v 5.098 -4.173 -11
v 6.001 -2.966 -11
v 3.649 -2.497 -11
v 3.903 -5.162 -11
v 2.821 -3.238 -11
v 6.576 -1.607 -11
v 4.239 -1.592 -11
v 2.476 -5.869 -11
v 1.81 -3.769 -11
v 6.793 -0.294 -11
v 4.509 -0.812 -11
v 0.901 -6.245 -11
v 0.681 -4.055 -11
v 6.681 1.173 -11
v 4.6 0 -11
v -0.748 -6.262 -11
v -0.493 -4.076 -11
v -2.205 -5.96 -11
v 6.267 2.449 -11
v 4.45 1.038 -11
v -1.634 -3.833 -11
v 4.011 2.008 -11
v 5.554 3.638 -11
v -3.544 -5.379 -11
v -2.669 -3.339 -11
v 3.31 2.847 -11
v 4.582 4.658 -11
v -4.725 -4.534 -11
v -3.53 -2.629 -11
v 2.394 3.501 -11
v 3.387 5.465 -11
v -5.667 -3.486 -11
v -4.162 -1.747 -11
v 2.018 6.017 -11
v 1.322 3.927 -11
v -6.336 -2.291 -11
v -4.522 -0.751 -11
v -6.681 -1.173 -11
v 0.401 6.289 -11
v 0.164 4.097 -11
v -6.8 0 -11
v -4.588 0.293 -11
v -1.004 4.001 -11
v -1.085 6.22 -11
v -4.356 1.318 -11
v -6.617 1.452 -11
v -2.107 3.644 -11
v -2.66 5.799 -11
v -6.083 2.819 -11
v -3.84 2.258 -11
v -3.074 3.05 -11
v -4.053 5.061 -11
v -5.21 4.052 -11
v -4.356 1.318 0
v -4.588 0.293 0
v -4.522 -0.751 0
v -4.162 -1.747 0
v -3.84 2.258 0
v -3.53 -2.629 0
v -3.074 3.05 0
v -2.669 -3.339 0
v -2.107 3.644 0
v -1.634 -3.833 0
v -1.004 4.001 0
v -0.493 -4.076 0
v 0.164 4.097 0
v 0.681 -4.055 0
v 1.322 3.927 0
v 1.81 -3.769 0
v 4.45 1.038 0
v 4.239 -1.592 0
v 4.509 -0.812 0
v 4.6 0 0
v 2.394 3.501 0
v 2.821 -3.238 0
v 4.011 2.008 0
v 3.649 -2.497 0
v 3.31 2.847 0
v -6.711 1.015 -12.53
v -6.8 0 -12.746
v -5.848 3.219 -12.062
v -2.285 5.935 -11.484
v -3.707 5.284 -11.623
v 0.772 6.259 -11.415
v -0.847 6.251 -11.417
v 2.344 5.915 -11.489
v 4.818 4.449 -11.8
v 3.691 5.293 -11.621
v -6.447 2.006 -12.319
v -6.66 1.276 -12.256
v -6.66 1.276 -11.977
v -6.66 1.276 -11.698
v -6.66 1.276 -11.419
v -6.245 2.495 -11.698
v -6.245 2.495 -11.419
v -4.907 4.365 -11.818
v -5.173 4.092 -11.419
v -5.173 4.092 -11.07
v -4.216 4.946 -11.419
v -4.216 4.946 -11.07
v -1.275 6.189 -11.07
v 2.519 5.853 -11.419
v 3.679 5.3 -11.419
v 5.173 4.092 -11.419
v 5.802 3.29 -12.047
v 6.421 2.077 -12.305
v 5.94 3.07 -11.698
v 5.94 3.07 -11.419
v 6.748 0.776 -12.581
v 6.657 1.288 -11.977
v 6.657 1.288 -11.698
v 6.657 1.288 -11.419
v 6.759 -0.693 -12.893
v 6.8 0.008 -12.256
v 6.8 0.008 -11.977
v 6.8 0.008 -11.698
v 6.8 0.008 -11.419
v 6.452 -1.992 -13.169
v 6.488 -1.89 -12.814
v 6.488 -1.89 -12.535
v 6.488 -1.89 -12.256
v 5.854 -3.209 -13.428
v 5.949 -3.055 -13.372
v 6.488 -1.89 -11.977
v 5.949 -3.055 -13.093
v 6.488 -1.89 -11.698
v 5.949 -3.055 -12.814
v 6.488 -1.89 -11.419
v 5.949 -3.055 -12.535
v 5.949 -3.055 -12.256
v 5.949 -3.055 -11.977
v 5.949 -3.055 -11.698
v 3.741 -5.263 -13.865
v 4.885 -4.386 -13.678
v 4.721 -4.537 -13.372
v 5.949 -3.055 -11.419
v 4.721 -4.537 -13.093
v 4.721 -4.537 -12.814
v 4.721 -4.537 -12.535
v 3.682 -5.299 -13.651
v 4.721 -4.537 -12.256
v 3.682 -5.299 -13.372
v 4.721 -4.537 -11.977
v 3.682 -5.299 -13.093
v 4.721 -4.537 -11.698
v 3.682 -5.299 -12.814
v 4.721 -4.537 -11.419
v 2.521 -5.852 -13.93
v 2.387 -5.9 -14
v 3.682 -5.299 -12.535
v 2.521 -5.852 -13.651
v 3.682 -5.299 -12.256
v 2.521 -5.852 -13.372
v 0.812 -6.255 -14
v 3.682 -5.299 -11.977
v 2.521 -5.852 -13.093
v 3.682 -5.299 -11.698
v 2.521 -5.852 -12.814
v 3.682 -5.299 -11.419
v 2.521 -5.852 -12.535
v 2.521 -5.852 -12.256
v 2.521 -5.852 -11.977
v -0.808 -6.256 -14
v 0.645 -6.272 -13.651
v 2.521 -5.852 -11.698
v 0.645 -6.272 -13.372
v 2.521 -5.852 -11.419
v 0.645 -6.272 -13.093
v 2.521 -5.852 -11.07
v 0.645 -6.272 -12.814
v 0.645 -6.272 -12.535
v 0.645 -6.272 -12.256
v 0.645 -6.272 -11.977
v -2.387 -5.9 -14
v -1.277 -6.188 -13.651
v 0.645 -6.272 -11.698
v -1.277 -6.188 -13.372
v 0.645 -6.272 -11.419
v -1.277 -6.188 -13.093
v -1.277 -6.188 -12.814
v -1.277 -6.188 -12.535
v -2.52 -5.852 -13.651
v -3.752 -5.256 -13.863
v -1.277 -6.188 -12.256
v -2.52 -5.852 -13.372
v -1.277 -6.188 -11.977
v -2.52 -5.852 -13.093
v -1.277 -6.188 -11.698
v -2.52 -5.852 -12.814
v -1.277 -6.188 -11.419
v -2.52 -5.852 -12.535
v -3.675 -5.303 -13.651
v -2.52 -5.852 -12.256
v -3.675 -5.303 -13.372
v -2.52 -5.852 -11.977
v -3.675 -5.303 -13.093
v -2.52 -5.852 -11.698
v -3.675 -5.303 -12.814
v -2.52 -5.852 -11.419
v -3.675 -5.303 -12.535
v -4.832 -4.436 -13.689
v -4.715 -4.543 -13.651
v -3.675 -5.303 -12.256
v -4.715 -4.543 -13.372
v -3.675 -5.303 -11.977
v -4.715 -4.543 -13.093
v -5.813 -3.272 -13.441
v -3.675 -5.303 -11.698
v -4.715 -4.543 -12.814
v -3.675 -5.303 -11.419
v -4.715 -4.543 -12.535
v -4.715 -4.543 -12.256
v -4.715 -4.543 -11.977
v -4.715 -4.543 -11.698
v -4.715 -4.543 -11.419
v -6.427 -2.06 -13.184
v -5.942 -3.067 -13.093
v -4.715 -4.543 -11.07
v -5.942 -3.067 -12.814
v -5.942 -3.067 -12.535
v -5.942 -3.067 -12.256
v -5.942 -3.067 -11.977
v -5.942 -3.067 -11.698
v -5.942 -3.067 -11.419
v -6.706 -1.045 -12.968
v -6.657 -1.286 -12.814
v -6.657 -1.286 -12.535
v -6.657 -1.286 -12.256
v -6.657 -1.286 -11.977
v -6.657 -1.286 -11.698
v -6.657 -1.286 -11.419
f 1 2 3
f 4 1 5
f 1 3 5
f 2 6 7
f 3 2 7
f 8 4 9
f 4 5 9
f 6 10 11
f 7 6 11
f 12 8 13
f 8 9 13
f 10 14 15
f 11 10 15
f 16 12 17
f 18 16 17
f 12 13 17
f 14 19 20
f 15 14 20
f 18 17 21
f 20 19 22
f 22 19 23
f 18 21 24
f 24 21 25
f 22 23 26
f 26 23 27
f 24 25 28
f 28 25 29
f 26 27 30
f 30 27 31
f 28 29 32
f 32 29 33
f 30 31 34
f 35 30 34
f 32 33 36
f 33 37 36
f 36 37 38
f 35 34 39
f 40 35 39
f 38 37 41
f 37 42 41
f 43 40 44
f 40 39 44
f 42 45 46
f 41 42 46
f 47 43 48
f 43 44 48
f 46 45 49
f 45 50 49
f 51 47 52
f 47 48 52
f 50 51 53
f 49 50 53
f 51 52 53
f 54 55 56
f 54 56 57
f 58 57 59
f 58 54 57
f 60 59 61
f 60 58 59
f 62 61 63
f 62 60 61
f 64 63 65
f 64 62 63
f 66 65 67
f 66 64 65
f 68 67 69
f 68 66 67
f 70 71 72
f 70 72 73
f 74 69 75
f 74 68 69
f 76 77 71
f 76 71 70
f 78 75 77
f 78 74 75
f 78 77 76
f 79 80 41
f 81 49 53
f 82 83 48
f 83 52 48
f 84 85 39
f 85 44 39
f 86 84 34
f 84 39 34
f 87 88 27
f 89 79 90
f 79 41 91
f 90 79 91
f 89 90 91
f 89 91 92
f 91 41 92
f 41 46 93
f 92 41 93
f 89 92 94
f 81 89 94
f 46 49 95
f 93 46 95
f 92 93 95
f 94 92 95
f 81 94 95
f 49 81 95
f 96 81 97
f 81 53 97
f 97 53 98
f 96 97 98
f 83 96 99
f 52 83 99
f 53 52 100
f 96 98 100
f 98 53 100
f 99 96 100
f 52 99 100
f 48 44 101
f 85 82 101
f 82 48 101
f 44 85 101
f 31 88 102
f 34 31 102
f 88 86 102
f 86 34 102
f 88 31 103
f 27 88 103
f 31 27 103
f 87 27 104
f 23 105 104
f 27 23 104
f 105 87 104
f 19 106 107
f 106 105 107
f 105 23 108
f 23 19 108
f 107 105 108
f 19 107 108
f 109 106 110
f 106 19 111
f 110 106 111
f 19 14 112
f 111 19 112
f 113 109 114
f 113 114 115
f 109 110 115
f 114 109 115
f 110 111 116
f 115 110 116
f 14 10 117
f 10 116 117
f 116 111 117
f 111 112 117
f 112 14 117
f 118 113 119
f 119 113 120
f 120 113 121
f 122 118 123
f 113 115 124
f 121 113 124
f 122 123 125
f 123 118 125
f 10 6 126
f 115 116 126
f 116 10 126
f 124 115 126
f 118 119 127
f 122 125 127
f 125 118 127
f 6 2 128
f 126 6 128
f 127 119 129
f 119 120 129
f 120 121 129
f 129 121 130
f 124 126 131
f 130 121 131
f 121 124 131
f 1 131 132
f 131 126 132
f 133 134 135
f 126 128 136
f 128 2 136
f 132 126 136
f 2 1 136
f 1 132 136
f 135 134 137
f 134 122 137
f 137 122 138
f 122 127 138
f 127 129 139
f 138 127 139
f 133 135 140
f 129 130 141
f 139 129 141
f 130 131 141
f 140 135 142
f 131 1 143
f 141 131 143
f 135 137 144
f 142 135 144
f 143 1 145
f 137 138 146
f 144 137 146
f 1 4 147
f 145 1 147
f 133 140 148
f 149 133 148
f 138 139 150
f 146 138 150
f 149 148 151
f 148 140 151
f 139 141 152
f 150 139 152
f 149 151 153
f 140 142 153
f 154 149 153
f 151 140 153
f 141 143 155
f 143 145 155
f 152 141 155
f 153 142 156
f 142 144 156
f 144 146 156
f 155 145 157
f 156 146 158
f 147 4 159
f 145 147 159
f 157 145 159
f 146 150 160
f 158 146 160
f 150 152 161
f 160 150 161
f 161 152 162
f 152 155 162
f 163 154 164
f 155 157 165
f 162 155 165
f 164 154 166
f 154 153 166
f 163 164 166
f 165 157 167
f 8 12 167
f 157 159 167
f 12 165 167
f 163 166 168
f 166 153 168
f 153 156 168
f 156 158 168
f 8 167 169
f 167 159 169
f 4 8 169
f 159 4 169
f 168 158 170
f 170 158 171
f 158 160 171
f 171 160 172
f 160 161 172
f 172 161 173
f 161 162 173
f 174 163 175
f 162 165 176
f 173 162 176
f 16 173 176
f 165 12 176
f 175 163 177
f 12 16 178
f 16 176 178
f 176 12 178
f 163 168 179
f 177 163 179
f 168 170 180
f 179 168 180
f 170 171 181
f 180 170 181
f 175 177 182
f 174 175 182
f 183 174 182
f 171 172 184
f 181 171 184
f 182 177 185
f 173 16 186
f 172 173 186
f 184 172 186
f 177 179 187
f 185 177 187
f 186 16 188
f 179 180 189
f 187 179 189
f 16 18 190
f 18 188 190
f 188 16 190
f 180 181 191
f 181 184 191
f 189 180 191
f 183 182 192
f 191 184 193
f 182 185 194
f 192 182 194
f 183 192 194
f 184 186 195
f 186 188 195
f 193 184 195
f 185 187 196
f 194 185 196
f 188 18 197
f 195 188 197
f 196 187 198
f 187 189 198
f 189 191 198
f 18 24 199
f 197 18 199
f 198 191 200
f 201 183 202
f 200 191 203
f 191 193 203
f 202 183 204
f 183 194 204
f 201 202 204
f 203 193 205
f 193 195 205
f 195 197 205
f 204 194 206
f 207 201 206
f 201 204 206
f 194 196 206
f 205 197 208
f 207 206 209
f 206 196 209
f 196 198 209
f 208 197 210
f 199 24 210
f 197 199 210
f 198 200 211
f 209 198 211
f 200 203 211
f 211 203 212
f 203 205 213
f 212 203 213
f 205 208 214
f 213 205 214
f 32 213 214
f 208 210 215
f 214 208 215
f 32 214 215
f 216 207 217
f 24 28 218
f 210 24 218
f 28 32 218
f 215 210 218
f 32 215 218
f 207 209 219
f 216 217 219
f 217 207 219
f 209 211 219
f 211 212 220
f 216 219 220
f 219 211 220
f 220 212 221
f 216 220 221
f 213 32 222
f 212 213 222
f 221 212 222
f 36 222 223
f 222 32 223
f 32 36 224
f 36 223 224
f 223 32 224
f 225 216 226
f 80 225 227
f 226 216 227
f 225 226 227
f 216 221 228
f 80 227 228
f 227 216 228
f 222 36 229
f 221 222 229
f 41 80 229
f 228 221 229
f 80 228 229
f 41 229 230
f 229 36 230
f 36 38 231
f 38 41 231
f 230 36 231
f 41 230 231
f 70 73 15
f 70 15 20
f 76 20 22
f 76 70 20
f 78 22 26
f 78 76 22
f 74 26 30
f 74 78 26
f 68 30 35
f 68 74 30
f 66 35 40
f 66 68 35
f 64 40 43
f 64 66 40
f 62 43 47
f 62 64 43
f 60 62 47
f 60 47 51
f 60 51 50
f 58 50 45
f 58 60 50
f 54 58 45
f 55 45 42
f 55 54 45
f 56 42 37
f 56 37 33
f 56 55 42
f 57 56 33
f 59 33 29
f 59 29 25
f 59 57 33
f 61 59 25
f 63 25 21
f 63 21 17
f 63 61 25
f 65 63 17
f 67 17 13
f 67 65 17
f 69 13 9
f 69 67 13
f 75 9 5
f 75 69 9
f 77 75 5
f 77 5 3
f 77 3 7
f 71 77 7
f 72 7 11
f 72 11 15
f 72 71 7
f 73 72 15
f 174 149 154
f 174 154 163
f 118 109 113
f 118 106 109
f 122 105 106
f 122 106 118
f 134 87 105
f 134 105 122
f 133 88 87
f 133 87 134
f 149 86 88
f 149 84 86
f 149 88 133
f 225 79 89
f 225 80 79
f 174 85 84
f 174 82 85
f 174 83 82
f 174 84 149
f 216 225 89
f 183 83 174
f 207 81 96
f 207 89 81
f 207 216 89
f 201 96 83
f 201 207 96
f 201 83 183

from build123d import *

# Parameters (mm, degrees)
ESQUISSE1_RX                 = 4.6
ESQUISSE1_RY                 = 4.1
BOSS_EXTRU_1_DEPTH           = 11
BOSS_EXTRU_2_DEPTH           = 3
ENL_V_MAT_EXTRU_1_DEPTH      = 17.790771458
ENL_V_MAT_EXTRU_1_DEPTH_BACK = 17.790771458


with BuildPart() as part:
    # Esquisse1 → Boss.-Extru.1 (new body)
    with BuildSketch(Plane.XY):
        with Locations((0, 0)):
            Ellipse(ESQUISSE1_RX, ESQUISSE1_RY)
    extrude(amount=-BOSS_EXTRU_1_DEPTH)

    # Esquisse2 → Boss.-Extru.2 (add)
    with BuildSketch(Plane(origin=(0, 0, -11), x_dir=(-1, 0, 0), z_dir=(0, 0, -1))):
        with BuildLine():
            add(Edge.make_bspline(
                [(6.8, 0), (6.8, 0.433288327), (6.752416239, 0.858366789), (6.5666935, 1.692899769), (6.425934966, 2.106464325), (6.065020779, 2.883515965), (5.845137822, 3.250234304), (5.457181249, 3.768157398), (5.318494152, 3.934660752), (5.027880252, 4.250125249), (4.875308752, 4.399972444), (4.556095583, 4.684394861), (4.389452723, 4.818968789), (4.042142028, 5.072893725), (3.860906146, 5.192472577), (3.306847789, 5.521794629), (2.920753337, 5.704885096), (2.116559382, 6.001289009), (1.696105458, 6.114317588), (0.853788781, 6.2628653), (0.428447413, 6.300064), (-0.215870939, 6.299967877), (-0.432632939, 6.290421243), (-0.860837611, 6.252626457), (-1.072888229, 6.224461454), (-1.702985778, 6.112619152), (-2.115035347, 6.001851771), (-2.720489724, 5.778696269), (-2.920517322, 5.694463053), (-3.307818383, 5.50998341), (-3.496159395, 5.409395212), (-4.045283112, 5.082631454), (-4.390334913, 4.831721536), (-4.873709908, 4.401578319), (-5.028199131, 4.249783181), (-5.318287954, 3.934880502), (-5.454754363, 3.771024564), (-5.710431524, 3.430429088), (-5.82964407, 3.253690889), (-6.050197932, 2.886871284), (-6.152014572, 2.69574531), (-6.425426988, 2.108484543), (-6.563239477, 1.704303519), (-6.750546991, 0.870766929), (-6.799427143, 0.436118566), (-6.800562574, -0.42060076), (-6.754602825, -0.845513068), (-6.614925469, -1.477640364), (-6.556491495, -1.686687236), (-6.418904109, -2.093093303), (-6.339500684, -2.291688747), (-6.159985006, -2.679886214), (-6.059871692, -2.869487776), (-5.838806436, -3.239641109), (-5.717766972, -3.420020335), (-5.331928585, -3.935871069), (-5.042233044, -4.250579864), (-4.560821108, -4.680506416), (-4.391806978, -4.817125956), (-4.044714464, -5.071132856), (-3.866002277, -5.189182606), (-3.314953555, -5.51748578), (-2.926157447, -5.702727312), (-2.115966571, -6.001672497), (-1.702778456, -6.112716045), (-1.071497529, -6.22467815), (-0.859140211, -6.252832392), (-0.430510974, -6.290551917), (-0.21365601, -6.300033709), (0.430786667, -6.299932309), (0.855993728, -6.26258887), (1.697634428, -6.11393502), (2.118192056, -6.000800114), (2.922433378, -5.70415255), (3.307418609, -5.521335965), (4.04218654, -5.084841779), (4.395081493, -4.827732104), (5.034128485, -4.258589957), (5.323310943, -3.945760174), (5.709346895, -3.432054044), (5.830642186, -3.25227207), (6.052893136, -2.882143426), (6.153424658, -2.692788699), (6.423703376, -2.112042029), (6.562478315, -1.708106747), (6.751855355, -0.864527395), (6.8, -0.433288327), (6.8, 0)],
                knots=[0, 0, 0, 0, 0.03125, 0.03125, 0.0625, 0.0625, 0.09375, 0.09375, 0.109375, 0.109375, 0.125, 0.125, 0.140625, 0.140625, 0.15625, 0.15625, 0.1875, 0.1875, 0.21875, 0.21875, 0.25, 0.25, 0.265625, 0.265625, 0.28125, 0.28125, 0.3125, 0.3125, 0.328125, 0.328125, 0.34375, 0.34375, 0.375, 0.375, 0.390625, 0.390625, 0.40625, 0.40625, 0.421875, 0.421875, 0.4375, 0.4375, 0.46875, 0.46875, 0.5, 0.5, 0.53125, 0.53125, 0.546875, 0.546875, 0.5625, 0.5625, 0.578125, 0.578125, 0.59375, 0.59375, 0.625, 0.625, 0.640625, 0.640625, 0.65625, 0.65625, 0.6875, 0.6875, 0.71875, 0.71875, 0.734375, 0.734375, 0.75, 0.75, 0.78125, 0.78125, 0.8125, 0.8125, 0.84375, 0.84375, 0.875, 0.875, 0.90625, 0.90625, 0.921875, 0.921875, 0.9375, 0.9375, 0.96875, 0.96875, 1, 1, 1, 1], degree=3))
        make_face()
    extrude(amount=BOSS_EXTRU_2_DEPTH)

    # Esquisse3 → Enlèv. mat.-Extru.1 (cut, two sides: drawn at the far end of the back side and taken through both)
    with BuildSketch(Plane(origin=(0, 0, 0), x_dir=(0, 0, -1), z_dir=(1, 0, 0)).offset(-ENL_V_MAT_EXTRU_1_DEPTH_BACK)):
        Polygon((14, 6.300000001), (11.406809962, 6.300000001), (14, -5.89999993), align=None)
    extrude(amount=ENL_V_MAT_EXTRU_1_DEPTH + ENL_V_MAT_EXTRU_1_DEPTH_BACK, mode=Mode.SUBTRACT)


solid = part.part
